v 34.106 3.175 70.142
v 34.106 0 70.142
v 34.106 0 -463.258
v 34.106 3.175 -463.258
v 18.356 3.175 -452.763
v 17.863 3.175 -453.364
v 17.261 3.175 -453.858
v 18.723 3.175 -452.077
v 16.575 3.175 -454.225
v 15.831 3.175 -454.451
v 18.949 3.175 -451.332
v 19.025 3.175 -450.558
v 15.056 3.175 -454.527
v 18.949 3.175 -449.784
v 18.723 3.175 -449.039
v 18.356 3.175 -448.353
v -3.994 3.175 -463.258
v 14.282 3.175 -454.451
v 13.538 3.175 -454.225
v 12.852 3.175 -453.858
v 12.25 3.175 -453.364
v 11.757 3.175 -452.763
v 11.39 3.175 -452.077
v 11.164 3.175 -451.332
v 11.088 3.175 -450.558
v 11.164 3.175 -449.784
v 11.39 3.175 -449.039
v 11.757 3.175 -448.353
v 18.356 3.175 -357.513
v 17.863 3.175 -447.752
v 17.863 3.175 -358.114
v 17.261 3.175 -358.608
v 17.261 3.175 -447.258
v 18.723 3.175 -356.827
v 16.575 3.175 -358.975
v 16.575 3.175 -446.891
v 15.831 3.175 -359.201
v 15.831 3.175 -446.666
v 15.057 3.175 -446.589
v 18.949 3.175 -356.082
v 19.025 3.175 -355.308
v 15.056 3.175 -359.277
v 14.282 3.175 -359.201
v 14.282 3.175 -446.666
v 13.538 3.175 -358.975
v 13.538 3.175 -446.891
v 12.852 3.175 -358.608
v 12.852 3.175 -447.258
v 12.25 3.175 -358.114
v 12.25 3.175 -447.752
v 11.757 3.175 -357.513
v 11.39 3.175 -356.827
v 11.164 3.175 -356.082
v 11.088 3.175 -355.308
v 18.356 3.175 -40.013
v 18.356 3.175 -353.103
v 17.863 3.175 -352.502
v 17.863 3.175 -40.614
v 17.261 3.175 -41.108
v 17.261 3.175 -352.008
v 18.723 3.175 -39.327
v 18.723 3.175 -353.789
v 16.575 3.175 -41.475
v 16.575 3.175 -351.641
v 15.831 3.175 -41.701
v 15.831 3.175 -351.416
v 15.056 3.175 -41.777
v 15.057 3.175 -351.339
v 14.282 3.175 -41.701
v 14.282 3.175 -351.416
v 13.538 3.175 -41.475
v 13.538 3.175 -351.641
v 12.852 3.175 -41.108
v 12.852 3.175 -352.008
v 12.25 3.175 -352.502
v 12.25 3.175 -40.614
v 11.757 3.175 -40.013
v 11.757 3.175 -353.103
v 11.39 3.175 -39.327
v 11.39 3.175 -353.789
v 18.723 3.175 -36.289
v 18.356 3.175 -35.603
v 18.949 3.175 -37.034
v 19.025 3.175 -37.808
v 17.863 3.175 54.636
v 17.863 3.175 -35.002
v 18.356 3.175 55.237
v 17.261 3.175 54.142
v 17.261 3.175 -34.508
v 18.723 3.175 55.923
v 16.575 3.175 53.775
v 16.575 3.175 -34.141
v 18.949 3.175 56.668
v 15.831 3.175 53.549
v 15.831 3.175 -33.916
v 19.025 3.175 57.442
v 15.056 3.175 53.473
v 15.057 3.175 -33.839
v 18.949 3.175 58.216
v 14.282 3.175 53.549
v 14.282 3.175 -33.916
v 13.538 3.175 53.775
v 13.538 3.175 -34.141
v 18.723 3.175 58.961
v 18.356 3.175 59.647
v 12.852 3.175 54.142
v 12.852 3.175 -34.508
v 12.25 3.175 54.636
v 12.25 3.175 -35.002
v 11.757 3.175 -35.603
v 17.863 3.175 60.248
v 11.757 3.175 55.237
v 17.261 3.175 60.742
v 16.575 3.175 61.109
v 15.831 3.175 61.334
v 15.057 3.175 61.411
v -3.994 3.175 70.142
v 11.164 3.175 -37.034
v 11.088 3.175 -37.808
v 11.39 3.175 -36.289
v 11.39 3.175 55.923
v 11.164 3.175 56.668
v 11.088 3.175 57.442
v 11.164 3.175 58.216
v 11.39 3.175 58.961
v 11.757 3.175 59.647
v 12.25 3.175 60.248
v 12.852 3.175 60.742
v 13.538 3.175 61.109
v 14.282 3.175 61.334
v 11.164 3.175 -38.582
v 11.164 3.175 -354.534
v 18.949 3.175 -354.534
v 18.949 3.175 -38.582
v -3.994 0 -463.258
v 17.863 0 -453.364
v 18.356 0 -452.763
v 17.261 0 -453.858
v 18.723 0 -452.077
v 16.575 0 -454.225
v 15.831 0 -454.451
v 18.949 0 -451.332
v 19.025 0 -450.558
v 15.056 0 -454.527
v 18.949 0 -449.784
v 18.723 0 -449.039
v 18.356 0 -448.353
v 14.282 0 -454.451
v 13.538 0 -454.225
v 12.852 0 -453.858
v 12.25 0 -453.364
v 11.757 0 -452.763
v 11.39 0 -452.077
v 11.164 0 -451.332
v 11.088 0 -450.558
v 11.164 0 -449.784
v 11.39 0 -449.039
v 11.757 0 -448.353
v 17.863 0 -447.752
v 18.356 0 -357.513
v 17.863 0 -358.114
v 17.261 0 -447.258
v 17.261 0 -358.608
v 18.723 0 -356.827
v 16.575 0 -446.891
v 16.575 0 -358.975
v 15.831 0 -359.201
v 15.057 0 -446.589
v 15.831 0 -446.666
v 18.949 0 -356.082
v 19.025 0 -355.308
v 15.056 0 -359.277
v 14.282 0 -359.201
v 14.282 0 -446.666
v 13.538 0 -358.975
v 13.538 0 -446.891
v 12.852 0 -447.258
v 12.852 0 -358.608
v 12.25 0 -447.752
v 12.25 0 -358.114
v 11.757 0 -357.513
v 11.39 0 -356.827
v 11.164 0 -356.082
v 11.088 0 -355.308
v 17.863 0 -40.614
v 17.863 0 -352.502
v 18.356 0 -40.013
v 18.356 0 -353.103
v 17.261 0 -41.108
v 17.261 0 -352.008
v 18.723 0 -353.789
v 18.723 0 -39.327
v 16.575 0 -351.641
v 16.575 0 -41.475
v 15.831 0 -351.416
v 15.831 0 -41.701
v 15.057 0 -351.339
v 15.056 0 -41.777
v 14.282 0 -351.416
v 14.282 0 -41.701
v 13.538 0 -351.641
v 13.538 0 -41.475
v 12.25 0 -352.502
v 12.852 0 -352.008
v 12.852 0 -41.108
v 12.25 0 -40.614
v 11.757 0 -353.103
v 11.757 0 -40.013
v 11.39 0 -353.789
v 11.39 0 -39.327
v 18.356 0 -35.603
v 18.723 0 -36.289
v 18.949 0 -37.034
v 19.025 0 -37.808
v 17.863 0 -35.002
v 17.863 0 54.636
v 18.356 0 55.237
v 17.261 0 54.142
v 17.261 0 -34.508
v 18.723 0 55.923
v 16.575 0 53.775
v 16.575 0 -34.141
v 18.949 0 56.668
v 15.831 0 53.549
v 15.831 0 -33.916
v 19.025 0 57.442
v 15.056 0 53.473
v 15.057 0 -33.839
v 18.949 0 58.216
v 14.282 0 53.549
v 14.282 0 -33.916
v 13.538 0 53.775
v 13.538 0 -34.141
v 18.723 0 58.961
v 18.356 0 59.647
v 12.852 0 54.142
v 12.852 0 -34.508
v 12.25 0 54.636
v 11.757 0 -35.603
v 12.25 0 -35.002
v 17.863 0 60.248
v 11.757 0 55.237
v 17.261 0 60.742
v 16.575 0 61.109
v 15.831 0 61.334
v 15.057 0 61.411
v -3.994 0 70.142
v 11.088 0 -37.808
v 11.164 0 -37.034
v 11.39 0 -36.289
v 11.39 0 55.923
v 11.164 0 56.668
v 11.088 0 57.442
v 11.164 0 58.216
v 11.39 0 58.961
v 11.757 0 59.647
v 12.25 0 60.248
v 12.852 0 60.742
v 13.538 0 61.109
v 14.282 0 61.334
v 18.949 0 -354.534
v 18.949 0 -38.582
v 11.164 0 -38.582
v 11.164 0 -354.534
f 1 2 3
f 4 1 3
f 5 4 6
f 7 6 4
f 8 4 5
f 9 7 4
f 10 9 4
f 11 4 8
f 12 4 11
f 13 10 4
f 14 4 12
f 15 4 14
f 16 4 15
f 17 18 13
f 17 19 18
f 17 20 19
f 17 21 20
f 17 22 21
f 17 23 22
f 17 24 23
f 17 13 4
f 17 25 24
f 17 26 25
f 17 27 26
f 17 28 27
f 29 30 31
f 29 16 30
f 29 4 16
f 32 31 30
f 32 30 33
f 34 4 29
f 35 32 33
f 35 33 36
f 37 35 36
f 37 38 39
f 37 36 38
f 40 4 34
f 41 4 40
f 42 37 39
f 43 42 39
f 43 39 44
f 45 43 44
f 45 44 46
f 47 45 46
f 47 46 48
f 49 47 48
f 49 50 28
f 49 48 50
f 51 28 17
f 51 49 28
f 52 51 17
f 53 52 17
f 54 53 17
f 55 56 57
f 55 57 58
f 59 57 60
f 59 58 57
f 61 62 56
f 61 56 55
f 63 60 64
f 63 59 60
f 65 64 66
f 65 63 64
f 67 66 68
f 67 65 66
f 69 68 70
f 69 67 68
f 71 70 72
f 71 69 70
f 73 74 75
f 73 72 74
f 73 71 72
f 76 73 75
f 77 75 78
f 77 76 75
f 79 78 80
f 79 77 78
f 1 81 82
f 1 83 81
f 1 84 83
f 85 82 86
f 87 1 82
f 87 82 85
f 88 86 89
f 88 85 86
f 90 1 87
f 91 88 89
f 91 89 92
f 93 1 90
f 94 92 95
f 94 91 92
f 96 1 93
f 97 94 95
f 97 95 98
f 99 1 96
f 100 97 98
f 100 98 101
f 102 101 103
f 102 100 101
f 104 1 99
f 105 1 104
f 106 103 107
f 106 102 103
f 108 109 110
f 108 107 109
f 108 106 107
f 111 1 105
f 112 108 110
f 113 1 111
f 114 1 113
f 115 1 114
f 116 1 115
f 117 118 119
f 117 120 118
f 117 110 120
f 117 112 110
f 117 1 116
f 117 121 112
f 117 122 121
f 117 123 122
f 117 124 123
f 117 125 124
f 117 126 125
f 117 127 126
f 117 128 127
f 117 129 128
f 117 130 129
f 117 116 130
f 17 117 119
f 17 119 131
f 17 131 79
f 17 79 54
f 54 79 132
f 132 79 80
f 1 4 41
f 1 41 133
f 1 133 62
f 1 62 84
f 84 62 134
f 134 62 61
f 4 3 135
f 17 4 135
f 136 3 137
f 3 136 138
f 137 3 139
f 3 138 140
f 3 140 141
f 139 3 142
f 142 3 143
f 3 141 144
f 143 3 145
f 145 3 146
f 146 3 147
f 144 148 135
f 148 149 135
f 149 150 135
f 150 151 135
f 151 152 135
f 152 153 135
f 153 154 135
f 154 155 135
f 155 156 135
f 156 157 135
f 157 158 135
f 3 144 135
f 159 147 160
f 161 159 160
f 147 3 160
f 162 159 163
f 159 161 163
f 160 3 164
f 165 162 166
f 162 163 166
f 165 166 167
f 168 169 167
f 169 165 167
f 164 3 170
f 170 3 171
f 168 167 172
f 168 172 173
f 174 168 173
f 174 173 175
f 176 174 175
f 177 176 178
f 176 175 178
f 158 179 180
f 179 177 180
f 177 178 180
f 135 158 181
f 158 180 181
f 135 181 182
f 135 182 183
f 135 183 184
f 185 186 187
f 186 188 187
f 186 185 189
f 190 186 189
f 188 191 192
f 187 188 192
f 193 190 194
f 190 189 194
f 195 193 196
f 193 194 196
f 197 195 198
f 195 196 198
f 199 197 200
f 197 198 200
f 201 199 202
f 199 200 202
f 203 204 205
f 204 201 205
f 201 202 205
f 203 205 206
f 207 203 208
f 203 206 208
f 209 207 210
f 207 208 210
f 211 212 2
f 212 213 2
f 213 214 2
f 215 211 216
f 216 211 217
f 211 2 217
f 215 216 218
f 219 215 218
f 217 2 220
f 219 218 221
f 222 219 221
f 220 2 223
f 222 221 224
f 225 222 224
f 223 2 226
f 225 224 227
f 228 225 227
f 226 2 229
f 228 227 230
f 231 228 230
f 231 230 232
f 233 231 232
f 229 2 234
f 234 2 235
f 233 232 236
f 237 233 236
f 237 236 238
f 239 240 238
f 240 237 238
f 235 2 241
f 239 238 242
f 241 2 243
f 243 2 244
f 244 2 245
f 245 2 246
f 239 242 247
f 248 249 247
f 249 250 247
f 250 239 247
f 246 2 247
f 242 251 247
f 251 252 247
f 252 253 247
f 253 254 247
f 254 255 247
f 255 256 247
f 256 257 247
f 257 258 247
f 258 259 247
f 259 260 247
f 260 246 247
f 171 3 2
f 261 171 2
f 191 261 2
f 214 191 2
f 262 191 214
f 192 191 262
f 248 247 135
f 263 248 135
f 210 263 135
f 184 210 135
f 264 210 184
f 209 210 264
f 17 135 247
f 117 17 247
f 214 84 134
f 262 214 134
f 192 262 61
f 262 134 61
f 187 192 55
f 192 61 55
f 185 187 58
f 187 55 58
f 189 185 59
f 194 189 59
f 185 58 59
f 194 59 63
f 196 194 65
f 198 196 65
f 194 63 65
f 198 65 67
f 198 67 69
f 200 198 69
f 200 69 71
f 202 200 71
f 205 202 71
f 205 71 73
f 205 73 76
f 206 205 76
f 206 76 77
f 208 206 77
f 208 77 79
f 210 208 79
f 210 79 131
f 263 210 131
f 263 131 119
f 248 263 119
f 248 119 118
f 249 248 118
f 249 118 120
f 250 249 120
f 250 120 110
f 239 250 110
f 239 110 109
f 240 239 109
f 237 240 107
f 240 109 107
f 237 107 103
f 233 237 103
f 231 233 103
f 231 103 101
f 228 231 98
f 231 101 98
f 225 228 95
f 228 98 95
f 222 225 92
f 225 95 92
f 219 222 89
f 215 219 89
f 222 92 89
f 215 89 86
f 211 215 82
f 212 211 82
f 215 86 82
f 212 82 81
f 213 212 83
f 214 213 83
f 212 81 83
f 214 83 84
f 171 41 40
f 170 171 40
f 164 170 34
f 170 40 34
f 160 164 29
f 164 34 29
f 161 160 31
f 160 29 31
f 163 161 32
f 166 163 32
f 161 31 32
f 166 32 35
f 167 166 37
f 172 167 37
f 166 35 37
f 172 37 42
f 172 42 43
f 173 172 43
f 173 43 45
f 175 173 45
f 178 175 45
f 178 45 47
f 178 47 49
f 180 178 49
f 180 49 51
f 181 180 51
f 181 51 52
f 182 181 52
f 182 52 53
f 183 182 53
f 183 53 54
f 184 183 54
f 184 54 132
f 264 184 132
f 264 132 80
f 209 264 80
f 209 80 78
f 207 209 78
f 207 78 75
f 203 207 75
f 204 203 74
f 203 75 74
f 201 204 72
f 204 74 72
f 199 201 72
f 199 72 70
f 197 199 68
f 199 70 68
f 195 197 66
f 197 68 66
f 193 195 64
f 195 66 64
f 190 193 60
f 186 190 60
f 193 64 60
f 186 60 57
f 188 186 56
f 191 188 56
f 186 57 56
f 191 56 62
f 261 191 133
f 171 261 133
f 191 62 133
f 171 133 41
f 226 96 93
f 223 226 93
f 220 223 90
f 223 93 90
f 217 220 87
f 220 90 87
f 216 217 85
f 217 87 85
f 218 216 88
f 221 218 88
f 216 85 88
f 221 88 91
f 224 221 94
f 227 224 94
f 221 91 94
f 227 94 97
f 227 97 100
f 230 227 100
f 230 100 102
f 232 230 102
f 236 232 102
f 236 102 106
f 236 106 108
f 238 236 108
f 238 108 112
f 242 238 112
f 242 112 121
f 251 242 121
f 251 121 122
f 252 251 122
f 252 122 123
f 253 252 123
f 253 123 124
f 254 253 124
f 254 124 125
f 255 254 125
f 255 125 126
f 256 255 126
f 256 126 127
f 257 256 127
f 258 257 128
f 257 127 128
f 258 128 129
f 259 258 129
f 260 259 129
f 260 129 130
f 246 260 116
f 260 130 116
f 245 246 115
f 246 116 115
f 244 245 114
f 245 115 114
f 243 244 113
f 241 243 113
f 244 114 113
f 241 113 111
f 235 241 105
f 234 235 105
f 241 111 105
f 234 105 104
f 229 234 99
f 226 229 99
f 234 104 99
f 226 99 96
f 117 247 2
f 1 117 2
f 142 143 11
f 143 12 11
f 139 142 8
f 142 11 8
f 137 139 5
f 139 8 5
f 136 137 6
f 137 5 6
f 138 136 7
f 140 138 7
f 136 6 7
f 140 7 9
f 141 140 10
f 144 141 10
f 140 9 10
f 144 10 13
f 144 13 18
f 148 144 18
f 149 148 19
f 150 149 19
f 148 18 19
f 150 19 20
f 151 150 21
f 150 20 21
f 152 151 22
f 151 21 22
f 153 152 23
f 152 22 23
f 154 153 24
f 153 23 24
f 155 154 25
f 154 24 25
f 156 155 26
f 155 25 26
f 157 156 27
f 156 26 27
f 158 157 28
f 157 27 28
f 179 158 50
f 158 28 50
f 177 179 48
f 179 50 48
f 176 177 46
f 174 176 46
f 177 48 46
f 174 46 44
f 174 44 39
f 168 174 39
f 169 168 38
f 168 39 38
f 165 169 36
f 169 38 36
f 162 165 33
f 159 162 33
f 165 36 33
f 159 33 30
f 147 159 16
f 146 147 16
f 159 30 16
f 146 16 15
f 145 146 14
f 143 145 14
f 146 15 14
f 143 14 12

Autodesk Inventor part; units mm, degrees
ref_plane "YZ Plane" through (0, 0, 0) normal (1, 0, 0) x (0, 1, 0)
ref_plane "XZ Plane" through (0, 0, 0) normal (0, 1, 0) x (-1, 0, 0)
ref_plane "XY Plane" through (0, 0, 0) normal (0, 0, 1) x (1, 0, 0)
sketch "Sketch1" plane through (0, 0, 0) normal (0, 1, 0) x (-1, 0, 0)
  line L0 (3.9935, 70.1419) -> (-34.1065, 70.1419)
  line L1 (-34.1065, 70.1419) -> (-34.1065, -463.2581)
  line L2 (-34.1065, -463.2581) -> (3.9935, -463.2581)
  line L3 (3.9935, -463.2581) -> (3.9935, 70.1419)
  point P0 (0, 0)
  dimension "d0" = 38.1
  dimension "d1" = 533.4
extrude "Extrusion1" add sketch "Sketch1" along normal blind 3.175
sketch "Sketch2" plane through (0, 3.175, 0) normal (0, 1, 0) x (1, 0, 0)
  line L0 (-3.9935, -70.1419) -> (34.1065, -70.1419) projected
  circle A0 centre (15.0565, -57.4419) radius 3.9688
  line L1 (34.1065, 463.2581) -> (-3.9935, 463.2581) projected
  circle A1 centre (15.0565, 450.5581) radius 3.9688
  line L2 (34.1065, -70.1419) -> (34.1065, 463.2581) projected
  line L3 (34.1065, 196.5581) -> (-3.9935, 196.5581)
  circle A2 centre (15.0565, 355.3081) radius 3.9688
  circle A3 centre (15.0565, 37.8081) radius 3.9688
  point P0 (0, 0)
  dimension "d5" = 7.9375
  dimension "d7" = 7.9375
  dimension "d10" = 7.9375
  dimension "d11" = 7.9375
  dimension "d14" = 12.7
  dimension "d15" = 107.95
  dimension "d16" = 12.7
  dimension "d17" = 107.95
extrude "Extrusion2" cut sketch "Sketch2" against normal blind 25.4
properties part number "Seat tabsnew"
